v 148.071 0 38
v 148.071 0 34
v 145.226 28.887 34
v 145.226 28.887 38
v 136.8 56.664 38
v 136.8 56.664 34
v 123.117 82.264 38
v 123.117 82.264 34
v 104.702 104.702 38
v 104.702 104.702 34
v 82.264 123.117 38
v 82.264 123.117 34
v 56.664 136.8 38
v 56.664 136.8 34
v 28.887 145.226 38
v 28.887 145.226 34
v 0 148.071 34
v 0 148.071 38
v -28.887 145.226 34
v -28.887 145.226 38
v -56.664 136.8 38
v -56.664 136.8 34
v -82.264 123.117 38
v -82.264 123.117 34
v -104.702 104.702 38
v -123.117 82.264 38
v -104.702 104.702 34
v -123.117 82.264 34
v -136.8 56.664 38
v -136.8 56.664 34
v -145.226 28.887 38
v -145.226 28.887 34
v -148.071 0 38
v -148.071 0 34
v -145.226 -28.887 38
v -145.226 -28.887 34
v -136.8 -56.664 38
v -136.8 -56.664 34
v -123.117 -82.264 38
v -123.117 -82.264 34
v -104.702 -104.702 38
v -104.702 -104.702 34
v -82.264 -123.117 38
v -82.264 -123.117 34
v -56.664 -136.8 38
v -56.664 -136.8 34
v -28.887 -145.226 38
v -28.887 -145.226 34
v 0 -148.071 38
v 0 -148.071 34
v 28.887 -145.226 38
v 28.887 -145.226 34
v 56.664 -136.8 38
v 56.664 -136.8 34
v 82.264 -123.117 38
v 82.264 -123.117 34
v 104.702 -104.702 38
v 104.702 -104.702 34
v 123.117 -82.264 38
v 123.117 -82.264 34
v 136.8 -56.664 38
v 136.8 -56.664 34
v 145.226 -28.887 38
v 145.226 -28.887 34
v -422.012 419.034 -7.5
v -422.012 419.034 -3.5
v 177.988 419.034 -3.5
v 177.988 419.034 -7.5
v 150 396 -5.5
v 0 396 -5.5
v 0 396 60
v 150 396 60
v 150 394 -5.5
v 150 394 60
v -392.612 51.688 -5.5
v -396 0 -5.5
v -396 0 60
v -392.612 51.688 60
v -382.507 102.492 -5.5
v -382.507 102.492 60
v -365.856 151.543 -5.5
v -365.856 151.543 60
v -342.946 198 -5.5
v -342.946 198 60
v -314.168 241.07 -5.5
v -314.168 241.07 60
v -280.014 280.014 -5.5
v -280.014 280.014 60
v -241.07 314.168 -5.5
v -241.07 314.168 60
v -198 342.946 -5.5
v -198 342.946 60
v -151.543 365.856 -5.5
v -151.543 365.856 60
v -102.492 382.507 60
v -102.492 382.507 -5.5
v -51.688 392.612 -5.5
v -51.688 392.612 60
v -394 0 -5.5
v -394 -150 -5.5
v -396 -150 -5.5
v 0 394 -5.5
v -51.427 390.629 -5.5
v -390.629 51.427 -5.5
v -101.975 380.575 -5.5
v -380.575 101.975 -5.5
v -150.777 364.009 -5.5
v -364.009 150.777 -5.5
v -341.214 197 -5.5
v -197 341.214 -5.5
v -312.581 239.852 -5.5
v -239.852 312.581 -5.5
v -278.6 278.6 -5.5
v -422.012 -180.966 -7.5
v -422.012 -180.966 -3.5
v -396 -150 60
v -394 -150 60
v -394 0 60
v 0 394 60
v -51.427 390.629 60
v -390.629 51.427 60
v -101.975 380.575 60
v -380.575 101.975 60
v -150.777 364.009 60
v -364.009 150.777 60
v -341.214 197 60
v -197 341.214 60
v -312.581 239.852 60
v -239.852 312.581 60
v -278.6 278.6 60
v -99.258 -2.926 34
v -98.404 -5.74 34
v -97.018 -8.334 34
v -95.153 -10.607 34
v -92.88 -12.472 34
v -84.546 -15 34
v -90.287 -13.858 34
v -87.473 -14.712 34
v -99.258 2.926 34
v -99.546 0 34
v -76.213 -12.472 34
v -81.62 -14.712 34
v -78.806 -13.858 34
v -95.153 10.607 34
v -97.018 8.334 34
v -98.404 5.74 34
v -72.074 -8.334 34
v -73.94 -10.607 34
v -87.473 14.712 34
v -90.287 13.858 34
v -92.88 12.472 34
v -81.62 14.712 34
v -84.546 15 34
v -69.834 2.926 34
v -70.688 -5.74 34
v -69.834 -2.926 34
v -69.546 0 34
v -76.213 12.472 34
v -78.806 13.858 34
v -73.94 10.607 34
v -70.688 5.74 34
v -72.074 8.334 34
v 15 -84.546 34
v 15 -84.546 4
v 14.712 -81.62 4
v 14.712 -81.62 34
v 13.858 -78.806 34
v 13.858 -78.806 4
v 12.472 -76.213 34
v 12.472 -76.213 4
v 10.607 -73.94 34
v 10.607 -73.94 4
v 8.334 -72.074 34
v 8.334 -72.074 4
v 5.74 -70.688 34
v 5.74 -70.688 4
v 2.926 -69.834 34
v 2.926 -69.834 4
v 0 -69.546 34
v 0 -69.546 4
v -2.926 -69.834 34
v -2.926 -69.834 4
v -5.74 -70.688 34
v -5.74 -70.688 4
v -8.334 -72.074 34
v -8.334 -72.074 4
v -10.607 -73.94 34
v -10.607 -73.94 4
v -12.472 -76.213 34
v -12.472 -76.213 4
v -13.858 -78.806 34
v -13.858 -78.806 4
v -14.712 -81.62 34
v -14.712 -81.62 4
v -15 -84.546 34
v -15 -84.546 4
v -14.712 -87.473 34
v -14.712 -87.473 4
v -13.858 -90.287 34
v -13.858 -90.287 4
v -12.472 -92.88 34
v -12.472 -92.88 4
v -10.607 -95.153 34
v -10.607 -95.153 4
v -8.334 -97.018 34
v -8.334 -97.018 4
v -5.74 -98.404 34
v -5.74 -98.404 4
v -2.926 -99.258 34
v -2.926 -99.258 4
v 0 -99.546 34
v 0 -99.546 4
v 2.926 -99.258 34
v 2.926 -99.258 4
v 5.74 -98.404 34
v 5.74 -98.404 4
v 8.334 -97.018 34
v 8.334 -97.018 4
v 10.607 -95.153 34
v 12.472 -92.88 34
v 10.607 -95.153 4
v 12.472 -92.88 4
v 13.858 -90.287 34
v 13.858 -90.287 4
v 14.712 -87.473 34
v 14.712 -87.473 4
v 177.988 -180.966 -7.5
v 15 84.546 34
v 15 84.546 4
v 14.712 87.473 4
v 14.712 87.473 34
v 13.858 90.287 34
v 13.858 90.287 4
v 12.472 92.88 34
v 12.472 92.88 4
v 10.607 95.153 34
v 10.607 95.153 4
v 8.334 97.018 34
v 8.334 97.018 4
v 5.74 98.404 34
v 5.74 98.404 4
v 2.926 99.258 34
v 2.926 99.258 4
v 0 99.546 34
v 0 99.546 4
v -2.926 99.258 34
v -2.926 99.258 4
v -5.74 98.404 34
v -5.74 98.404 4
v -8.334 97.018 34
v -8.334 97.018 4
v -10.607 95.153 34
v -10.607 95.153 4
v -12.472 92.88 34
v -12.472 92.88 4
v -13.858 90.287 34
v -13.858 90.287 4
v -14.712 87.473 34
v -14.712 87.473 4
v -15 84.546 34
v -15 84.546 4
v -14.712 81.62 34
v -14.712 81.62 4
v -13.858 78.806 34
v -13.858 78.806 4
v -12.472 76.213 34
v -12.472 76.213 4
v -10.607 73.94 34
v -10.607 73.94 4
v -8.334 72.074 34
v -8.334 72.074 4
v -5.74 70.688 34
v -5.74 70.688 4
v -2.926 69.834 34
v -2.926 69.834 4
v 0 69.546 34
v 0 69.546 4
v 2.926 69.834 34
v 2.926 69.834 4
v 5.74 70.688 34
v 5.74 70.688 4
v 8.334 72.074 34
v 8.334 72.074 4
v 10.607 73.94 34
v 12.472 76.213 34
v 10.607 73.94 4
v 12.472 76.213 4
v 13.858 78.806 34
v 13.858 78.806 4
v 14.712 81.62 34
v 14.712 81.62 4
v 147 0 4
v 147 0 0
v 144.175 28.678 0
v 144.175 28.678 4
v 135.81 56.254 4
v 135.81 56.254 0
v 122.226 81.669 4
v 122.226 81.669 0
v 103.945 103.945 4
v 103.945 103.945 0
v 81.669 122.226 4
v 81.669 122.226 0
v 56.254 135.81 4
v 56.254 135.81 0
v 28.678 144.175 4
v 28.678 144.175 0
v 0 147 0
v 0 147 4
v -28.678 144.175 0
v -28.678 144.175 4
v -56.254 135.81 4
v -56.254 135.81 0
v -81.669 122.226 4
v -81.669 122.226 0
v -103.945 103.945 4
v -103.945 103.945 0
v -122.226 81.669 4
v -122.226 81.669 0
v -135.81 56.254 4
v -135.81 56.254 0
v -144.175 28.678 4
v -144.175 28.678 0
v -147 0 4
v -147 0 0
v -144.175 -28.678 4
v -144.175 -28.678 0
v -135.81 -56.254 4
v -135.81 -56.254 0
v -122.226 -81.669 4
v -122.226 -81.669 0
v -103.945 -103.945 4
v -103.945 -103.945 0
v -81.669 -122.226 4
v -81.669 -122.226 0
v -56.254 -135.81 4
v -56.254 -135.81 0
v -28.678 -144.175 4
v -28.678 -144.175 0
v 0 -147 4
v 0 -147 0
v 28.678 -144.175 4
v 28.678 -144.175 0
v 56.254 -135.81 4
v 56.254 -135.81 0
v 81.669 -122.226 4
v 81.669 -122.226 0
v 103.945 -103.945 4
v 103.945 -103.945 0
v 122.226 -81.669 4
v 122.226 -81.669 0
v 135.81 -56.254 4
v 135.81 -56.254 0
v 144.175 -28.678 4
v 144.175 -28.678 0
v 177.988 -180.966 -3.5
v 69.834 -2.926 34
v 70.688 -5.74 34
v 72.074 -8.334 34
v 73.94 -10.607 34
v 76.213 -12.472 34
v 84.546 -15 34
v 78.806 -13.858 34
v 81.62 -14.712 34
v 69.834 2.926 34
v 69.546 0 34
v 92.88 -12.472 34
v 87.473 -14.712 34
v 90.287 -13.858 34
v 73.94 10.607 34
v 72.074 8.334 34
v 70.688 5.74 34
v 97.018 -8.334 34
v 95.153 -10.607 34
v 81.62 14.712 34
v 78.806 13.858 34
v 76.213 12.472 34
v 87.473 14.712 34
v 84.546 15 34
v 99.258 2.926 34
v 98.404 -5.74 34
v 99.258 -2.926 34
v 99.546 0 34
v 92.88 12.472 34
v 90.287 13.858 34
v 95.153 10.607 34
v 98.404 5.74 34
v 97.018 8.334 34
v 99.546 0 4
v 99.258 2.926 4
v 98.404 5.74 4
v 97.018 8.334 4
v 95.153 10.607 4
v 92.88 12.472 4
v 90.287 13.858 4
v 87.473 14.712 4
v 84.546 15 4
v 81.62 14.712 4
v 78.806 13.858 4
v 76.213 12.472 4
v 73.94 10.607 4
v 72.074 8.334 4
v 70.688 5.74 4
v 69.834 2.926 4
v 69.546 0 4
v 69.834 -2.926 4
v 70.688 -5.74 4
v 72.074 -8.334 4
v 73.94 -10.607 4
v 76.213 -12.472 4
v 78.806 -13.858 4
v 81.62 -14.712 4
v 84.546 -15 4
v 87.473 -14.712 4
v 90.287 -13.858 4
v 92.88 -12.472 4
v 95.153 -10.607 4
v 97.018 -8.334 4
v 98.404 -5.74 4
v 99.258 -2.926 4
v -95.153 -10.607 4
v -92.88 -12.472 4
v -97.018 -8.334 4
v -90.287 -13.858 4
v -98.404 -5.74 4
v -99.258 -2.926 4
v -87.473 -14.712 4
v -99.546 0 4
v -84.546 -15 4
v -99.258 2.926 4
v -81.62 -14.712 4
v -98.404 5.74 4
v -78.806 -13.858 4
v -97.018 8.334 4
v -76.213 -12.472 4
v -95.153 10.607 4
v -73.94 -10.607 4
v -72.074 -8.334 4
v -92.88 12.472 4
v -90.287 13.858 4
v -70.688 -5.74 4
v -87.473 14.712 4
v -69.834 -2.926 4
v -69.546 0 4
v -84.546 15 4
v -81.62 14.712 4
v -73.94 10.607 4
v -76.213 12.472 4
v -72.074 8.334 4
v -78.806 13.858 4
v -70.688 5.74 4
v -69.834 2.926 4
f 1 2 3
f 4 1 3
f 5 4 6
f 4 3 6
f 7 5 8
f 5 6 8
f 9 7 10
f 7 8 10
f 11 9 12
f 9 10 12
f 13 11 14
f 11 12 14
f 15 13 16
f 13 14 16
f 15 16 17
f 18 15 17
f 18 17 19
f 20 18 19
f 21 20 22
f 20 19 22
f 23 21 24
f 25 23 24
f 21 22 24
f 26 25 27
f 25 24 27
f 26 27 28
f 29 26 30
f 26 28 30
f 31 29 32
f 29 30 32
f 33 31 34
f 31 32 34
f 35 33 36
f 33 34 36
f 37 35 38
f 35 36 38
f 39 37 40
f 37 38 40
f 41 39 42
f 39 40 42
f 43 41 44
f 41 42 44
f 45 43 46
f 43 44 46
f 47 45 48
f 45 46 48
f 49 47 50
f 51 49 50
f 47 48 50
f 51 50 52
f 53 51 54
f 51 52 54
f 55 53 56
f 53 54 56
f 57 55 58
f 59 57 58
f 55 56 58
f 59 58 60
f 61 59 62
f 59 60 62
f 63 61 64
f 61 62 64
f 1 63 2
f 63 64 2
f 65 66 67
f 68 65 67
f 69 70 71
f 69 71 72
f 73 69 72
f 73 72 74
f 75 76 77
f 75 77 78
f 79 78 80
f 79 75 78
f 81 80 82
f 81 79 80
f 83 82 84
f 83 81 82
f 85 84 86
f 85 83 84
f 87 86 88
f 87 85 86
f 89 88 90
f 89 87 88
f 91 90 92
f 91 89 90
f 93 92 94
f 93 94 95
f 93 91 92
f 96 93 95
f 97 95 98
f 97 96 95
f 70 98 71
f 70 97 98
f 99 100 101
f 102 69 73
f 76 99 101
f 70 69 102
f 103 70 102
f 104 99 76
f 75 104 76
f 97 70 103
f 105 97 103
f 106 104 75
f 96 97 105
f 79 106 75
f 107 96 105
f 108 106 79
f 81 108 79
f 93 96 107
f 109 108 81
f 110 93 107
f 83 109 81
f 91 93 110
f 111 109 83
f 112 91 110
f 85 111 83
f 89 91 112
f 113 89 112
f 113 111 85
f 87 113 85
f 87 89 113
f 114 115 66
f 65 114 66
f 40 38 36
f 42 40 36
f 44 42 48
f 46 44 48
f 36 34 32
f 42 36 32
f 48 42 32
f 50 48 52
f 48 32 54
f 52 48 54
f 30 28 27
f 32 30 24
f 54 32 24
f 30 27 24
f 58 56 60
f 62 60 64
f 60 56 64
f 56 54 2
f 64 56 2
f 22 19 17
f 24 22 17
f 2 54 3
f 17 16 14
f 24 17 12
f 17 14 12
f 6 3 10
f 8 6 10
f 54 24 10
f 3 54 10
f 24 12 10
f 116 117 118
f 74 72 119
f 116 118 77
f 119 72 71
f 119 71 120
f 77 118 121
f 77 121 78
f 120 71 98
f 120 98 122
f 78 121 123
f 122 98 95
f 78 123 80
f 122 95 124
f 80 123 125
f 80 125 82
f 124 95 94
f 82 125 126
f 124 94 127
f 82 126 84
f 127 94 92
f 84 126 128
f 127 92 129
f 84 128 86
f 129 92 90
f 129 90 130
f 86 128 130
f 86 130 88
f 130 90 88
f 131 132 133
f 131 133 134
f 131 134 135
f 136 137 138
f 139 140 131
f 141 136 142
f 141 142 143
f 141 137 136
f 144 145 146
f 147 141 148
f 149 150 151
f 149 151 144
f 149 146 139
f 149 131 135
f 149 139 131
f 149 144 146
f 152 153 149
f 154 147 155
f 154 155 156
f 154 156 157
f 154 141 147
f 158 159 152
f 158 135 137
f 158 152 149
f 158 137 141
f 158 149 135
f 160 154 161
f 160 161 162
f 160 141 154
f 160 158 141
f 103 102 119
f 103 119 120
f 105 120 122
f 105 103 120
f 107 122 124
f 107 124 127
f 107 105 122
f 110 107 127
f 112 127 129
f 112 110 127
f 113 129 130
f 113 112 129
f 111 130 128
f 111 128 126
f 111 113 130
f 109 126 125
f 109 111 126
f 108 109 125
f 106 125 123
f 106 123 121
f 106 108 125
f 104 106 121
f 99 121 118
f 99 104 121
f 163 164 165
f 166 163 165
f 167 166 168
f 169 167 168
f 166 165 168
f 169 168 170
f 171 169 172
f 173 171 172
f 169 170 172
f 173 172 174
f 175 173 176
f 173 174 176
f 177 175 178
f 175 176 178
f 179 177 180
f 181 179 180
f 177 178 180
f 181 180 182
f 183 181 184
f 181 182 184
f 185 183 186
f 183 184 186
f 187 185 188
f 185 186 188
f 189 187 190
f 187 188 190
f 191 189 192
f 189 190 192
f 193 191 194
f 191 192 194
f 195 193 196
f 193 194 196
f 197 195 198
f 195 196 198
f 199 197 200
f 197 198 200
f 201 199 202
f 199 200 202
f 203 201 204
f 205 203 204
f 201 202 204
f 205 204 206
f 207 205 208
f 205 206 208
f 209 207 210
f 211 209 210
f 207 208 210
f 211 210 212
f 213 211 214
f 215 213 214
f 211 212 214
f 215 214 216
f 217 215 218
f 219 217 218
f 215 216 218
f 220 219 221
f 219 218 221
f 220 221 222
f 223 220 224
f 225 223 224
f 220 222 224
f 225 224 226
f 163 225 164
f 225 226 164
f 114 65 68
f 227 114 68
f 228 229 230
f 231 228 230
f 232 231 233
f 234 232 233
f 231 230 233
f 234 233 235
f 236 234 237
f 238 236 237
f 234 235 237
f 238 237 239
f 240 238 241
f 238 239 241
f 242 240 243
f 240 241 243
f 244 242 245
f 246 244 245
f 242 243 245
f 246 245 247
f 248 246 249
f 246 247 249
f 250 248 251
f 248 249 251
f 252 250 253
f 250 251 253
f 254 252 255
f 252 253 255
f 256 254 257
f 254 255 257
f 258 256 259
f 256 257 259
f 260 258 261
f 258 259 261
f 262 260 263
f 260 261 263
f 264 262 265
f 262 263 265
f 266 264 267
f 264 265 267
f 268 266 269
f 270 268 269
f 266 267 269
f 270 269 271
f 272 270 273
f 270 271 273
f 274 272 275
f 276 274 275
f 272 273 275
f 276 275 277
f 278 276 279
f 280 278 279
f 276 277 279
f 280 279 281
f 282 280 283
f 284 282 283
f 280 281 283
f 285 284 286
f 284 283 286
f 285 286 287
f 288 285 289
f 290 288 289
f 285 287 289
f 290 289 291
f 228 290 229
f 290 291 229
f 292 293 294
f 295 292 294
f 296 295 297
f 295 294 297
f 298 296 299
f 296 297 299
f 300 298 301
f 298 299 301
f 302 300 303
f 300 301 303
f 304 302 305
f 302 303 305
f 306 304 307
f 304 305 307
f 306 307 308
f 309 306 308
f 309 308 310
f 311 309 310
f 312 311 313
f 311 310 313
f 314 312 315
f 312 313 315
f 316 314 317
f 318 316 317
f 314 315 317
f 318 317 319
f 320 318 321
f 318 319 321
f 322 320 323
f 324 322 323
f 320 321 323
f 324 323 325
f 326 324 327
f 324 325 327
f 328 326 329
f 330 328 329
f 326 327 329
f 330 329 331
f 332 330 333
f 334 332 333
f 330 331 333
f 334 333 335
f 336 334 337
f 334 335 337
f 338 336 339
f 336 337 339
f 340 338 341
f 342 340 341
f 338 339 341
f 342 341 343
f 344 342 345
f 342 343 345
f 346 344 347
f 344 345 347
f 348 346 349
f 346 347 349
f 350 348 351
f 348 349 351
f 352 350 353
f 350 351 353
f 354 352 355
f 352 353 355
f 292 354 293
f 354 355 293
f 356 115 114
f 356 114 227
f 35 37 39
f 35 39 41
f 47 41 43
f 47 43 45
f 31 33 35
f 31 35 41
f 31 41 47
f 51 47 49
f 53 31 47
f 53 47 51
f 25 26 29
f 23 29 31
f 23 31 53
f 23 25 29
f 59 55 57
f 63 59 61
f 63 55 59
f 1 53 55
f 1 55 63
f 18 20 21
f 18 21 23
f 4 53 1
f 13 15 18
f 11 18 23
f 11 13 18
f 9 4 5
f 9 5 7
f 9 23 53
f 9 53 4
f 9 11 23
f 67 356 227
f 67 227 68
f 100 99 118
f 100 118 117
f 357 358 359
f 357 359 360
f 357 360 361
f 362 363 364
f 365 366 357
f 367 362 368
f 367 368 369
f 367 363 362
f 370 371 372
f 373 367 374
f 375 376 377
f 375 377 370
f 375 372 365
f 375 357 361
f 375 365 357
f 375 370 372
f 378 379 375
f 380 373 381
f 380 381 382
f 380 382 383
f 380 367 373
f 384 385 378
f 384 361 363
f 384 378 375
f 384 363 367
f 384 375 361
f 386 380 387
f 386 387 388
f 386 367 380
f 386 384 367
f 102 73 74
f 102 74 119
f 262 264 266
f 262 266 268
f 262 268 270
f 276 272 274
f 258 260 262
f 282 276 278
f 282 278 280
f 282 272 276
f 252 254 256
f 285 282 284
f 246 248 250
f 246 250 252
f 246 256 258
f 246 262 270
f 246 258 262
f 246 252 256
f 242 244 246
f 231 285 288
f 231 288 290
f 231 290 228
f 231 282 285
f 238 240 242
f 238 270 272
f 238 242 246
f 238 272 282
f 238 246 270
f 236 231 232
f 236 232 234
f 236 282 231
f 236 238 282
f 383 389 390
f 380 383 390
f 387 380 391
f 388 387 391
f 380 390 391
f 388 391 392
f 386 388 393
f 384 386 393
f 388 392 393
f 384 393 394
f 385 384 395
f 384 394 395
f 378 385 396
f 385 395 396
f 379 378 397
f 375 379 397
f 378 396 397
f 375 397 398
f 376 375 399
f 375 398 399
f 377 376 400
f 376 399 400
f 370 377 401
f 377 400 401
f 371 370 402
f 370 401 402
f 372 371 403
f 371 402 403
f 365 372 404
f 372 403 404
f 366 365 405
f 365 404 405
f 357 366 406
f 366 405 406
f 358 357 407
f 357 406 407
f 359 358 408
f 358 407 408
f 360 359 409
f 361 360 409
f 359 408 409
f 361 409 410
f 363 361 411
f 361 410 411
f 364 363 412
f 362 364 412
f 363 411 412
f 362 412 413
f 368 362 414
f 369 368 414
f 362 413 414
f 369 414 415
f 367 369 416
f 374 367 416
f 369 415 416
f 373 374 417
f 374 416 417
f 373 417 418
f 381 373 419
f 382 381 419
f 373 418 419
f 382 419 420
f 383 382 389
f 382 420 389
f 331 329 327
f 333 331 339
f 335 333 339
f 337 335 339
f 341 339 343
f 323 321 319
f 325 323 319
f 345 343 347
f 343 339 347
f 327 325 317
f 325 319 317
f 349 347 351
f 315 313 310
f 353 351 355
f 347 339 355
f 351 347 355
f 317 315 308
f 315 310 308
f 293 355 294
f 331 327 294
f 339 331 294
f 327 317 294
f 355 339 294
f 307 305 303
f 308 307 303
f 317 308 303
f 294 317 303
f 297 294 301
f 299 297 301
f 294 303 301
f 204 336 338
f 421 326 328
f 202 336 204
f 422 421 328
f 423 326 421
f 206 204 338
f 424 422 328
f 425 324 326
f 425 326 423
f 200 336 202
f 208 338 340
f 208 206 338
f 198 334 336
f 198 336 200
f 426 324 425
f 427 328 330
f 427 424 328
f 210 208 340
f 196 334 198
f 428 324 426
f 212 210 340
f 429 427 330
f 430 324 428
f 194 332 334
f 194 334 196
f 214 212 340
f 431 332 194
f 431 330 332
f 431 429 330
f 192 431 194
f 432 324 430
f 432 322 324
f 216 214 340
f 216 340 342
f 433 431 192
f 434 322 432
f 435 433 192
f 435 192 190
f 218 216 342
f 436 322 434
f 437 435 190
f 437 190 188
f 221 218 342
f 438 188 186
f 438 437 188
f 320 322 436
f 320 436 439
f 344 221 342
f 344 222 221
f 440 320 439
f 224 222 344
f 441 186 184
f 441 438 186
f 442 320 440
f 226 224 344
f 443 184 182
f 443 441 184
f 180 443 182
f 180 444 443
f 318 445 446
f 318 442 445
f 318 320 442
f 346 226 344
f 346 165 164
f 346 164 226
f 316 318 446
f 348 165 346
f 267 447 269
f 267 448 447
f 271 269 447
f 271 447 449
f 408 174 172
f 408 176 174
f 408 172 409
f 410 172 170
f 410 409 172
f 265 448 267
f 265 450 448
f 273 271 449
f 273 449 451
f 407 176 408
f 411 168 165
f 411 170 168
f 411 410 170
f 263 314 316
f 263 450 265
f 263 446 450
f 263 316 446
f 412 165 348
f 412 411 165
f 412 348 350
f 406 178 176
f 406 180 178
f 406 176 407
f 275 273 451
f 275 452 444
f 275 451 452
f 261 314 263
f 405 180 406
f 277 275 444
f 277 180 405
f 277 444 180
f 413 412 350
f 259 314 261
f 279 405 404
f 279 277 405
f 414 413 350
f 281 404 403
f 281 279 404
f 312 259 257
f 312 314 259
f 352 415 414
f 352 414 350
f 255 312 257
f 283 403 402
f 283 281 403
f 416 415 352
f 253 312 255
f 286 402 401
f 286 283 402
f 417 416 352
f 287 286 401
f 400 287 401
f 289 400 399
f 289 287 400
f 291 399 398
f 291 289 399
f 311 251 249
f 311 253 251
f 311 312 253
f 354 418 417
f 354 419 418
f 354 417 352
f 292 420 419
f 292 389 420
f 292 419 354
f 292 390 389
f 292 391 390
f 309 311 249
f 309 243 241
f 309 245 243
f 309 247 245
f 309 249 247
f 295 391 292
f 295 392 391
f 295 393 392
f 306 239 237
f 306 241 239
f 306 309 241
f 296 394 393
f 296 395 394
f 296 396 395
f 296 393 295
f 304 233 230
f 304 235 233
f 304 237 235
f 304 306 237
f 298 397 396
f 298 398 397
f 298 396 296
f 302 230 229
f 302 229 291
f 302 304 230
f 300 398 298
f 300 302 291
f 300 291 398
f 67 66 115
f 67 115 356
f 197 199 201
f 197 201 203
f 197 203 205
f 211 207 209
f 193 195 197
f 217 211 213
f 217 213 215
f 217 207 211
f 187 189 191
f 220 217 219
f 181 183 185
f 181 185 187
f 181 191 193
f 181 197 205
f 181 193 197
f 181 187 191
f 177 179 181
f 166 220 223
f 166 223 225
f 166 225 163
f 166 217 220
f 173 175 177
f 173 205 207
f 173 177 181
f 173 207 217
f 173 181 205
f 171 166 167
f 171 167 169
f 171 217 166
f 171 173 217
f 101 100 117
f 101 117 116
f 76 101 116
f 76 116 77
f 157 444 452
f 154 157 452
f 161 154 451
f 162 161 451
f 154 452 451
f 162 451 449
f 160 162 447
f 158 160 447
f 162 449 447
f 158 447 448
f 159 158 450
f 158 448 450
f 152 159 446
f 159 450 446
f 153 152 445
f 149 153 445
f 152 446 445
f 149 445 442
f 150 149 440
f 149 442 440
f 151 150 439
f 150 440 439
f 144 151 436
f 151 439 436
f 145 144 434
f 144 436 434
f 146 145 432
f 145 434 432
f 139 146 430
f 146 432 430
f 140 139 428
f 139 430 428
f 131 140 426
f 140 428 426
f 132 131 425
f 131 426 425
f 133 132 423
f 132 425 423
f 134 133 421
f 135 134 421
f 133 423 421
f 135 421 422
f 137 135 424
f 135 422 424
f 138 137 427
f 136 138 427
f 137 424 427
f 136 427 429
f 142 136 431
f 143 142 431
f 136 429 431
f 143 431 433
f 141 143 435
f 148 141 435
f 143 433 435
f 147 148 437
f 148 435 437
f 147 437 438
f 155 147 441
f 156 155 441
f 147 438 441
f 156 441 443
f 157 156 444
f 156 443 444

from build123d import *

# Parameters (mm, degrees)
SKETCH1_R                = 147
BOSS_EXTRUDE1_DEPTH      = 4
EXTRUDE_THIN1_DEPTH      = 60
EXTRUDE_THIN1_DEPTH_BACK = 5.5
SKETCH2_R                = 148.070981451
BOSS_EXTRUDE2_DEPTH      = 4
SKETCH3_R                = 15
BOSS_EXTRUDE3_DEPTH      = 30
SKETCH5_W                = 600
SKETCH5_H                = 600
BOSS_EXTRUDE5_DEPTH      = 4


with BuildPart() as part:
    # Sketch1 → Boss-Extrude1 (new body)
    with BuildSketch(Plane.XY):
        Circle(SKETCH1_R)
    extrude(amount=BOSS_EXTRUDE1_DEPTH)

    # Sketch3 → Boss-Extrude3 (add)
    with BuildSketch(Plane.XY.offset(4)):
        with Locations((0, 84.546251692)):
            Circle(SKETCH3_R)
        with Locations((84.546251692, 0)):
            Circle(SKETCH3_R)
        with Locations((0, -84.546251692)):
            Circle(SKETCH3_R)
        with Locations((-84.546251692, 0)):
            Circle(SKETCH3_R)
    extrude(amount=BOSS_EXTRUDE3_DEPTH)


with BuildPart() as body_2:
    # Sketch1<4> → Extrude-Thin1 (new, two sides: drawn at the far end of the back side and taken through both)
    with BuildSketch(Plane.XY.offset(-EXTRUDE_THIN1_DEPTH_BACK)):
        with BuildLine():
            Line((150, 394), (0, 394))
            ThreePointArc((0, 394), (-278.600071787, 278.600071787), (-394, 0))
            Line((-394, 0), (-394, -150))
            Line((-394, -150), (-396, -150))
            Line((-396, -150), (-396, 0))
            ThreePointArc((-396, 0), (-280.01428535, 280.01428535), (0, 396))
            Line((0, 396), (150, 396))
            Line((150, 396), (150, 394))
        make_face()
    extrude(amount=EXTRUDE_THIN1_DEPTH + EXTRUDE_THIN1_DEPTH_BACK)


with BuildPart() as body_3:
    # Sketch2 → Boss-Extrude2 (new body)
    with BuildSketch(Plane.XY.offset(34)):
        Circle(SKETCH2_R)
    extrude(amount=BOSS_EXTRUDE2_DEPTH)


with BuildPart() as body_4:
    # Sketch5 → Boss-Extrude5 (new body)
    with BuildSketch(Plane.XY.offset(-3.5)):
        with Locations((-122.012002147, 119.033794954)):
            Rectangle(SKETCH5_W, SKETCH5_H)
    extrude(amount=-BOSS_EXTRUDE5_DEPTH)


solid = Compound([part.part, body_2.part, body_3.part, body_4.part])
